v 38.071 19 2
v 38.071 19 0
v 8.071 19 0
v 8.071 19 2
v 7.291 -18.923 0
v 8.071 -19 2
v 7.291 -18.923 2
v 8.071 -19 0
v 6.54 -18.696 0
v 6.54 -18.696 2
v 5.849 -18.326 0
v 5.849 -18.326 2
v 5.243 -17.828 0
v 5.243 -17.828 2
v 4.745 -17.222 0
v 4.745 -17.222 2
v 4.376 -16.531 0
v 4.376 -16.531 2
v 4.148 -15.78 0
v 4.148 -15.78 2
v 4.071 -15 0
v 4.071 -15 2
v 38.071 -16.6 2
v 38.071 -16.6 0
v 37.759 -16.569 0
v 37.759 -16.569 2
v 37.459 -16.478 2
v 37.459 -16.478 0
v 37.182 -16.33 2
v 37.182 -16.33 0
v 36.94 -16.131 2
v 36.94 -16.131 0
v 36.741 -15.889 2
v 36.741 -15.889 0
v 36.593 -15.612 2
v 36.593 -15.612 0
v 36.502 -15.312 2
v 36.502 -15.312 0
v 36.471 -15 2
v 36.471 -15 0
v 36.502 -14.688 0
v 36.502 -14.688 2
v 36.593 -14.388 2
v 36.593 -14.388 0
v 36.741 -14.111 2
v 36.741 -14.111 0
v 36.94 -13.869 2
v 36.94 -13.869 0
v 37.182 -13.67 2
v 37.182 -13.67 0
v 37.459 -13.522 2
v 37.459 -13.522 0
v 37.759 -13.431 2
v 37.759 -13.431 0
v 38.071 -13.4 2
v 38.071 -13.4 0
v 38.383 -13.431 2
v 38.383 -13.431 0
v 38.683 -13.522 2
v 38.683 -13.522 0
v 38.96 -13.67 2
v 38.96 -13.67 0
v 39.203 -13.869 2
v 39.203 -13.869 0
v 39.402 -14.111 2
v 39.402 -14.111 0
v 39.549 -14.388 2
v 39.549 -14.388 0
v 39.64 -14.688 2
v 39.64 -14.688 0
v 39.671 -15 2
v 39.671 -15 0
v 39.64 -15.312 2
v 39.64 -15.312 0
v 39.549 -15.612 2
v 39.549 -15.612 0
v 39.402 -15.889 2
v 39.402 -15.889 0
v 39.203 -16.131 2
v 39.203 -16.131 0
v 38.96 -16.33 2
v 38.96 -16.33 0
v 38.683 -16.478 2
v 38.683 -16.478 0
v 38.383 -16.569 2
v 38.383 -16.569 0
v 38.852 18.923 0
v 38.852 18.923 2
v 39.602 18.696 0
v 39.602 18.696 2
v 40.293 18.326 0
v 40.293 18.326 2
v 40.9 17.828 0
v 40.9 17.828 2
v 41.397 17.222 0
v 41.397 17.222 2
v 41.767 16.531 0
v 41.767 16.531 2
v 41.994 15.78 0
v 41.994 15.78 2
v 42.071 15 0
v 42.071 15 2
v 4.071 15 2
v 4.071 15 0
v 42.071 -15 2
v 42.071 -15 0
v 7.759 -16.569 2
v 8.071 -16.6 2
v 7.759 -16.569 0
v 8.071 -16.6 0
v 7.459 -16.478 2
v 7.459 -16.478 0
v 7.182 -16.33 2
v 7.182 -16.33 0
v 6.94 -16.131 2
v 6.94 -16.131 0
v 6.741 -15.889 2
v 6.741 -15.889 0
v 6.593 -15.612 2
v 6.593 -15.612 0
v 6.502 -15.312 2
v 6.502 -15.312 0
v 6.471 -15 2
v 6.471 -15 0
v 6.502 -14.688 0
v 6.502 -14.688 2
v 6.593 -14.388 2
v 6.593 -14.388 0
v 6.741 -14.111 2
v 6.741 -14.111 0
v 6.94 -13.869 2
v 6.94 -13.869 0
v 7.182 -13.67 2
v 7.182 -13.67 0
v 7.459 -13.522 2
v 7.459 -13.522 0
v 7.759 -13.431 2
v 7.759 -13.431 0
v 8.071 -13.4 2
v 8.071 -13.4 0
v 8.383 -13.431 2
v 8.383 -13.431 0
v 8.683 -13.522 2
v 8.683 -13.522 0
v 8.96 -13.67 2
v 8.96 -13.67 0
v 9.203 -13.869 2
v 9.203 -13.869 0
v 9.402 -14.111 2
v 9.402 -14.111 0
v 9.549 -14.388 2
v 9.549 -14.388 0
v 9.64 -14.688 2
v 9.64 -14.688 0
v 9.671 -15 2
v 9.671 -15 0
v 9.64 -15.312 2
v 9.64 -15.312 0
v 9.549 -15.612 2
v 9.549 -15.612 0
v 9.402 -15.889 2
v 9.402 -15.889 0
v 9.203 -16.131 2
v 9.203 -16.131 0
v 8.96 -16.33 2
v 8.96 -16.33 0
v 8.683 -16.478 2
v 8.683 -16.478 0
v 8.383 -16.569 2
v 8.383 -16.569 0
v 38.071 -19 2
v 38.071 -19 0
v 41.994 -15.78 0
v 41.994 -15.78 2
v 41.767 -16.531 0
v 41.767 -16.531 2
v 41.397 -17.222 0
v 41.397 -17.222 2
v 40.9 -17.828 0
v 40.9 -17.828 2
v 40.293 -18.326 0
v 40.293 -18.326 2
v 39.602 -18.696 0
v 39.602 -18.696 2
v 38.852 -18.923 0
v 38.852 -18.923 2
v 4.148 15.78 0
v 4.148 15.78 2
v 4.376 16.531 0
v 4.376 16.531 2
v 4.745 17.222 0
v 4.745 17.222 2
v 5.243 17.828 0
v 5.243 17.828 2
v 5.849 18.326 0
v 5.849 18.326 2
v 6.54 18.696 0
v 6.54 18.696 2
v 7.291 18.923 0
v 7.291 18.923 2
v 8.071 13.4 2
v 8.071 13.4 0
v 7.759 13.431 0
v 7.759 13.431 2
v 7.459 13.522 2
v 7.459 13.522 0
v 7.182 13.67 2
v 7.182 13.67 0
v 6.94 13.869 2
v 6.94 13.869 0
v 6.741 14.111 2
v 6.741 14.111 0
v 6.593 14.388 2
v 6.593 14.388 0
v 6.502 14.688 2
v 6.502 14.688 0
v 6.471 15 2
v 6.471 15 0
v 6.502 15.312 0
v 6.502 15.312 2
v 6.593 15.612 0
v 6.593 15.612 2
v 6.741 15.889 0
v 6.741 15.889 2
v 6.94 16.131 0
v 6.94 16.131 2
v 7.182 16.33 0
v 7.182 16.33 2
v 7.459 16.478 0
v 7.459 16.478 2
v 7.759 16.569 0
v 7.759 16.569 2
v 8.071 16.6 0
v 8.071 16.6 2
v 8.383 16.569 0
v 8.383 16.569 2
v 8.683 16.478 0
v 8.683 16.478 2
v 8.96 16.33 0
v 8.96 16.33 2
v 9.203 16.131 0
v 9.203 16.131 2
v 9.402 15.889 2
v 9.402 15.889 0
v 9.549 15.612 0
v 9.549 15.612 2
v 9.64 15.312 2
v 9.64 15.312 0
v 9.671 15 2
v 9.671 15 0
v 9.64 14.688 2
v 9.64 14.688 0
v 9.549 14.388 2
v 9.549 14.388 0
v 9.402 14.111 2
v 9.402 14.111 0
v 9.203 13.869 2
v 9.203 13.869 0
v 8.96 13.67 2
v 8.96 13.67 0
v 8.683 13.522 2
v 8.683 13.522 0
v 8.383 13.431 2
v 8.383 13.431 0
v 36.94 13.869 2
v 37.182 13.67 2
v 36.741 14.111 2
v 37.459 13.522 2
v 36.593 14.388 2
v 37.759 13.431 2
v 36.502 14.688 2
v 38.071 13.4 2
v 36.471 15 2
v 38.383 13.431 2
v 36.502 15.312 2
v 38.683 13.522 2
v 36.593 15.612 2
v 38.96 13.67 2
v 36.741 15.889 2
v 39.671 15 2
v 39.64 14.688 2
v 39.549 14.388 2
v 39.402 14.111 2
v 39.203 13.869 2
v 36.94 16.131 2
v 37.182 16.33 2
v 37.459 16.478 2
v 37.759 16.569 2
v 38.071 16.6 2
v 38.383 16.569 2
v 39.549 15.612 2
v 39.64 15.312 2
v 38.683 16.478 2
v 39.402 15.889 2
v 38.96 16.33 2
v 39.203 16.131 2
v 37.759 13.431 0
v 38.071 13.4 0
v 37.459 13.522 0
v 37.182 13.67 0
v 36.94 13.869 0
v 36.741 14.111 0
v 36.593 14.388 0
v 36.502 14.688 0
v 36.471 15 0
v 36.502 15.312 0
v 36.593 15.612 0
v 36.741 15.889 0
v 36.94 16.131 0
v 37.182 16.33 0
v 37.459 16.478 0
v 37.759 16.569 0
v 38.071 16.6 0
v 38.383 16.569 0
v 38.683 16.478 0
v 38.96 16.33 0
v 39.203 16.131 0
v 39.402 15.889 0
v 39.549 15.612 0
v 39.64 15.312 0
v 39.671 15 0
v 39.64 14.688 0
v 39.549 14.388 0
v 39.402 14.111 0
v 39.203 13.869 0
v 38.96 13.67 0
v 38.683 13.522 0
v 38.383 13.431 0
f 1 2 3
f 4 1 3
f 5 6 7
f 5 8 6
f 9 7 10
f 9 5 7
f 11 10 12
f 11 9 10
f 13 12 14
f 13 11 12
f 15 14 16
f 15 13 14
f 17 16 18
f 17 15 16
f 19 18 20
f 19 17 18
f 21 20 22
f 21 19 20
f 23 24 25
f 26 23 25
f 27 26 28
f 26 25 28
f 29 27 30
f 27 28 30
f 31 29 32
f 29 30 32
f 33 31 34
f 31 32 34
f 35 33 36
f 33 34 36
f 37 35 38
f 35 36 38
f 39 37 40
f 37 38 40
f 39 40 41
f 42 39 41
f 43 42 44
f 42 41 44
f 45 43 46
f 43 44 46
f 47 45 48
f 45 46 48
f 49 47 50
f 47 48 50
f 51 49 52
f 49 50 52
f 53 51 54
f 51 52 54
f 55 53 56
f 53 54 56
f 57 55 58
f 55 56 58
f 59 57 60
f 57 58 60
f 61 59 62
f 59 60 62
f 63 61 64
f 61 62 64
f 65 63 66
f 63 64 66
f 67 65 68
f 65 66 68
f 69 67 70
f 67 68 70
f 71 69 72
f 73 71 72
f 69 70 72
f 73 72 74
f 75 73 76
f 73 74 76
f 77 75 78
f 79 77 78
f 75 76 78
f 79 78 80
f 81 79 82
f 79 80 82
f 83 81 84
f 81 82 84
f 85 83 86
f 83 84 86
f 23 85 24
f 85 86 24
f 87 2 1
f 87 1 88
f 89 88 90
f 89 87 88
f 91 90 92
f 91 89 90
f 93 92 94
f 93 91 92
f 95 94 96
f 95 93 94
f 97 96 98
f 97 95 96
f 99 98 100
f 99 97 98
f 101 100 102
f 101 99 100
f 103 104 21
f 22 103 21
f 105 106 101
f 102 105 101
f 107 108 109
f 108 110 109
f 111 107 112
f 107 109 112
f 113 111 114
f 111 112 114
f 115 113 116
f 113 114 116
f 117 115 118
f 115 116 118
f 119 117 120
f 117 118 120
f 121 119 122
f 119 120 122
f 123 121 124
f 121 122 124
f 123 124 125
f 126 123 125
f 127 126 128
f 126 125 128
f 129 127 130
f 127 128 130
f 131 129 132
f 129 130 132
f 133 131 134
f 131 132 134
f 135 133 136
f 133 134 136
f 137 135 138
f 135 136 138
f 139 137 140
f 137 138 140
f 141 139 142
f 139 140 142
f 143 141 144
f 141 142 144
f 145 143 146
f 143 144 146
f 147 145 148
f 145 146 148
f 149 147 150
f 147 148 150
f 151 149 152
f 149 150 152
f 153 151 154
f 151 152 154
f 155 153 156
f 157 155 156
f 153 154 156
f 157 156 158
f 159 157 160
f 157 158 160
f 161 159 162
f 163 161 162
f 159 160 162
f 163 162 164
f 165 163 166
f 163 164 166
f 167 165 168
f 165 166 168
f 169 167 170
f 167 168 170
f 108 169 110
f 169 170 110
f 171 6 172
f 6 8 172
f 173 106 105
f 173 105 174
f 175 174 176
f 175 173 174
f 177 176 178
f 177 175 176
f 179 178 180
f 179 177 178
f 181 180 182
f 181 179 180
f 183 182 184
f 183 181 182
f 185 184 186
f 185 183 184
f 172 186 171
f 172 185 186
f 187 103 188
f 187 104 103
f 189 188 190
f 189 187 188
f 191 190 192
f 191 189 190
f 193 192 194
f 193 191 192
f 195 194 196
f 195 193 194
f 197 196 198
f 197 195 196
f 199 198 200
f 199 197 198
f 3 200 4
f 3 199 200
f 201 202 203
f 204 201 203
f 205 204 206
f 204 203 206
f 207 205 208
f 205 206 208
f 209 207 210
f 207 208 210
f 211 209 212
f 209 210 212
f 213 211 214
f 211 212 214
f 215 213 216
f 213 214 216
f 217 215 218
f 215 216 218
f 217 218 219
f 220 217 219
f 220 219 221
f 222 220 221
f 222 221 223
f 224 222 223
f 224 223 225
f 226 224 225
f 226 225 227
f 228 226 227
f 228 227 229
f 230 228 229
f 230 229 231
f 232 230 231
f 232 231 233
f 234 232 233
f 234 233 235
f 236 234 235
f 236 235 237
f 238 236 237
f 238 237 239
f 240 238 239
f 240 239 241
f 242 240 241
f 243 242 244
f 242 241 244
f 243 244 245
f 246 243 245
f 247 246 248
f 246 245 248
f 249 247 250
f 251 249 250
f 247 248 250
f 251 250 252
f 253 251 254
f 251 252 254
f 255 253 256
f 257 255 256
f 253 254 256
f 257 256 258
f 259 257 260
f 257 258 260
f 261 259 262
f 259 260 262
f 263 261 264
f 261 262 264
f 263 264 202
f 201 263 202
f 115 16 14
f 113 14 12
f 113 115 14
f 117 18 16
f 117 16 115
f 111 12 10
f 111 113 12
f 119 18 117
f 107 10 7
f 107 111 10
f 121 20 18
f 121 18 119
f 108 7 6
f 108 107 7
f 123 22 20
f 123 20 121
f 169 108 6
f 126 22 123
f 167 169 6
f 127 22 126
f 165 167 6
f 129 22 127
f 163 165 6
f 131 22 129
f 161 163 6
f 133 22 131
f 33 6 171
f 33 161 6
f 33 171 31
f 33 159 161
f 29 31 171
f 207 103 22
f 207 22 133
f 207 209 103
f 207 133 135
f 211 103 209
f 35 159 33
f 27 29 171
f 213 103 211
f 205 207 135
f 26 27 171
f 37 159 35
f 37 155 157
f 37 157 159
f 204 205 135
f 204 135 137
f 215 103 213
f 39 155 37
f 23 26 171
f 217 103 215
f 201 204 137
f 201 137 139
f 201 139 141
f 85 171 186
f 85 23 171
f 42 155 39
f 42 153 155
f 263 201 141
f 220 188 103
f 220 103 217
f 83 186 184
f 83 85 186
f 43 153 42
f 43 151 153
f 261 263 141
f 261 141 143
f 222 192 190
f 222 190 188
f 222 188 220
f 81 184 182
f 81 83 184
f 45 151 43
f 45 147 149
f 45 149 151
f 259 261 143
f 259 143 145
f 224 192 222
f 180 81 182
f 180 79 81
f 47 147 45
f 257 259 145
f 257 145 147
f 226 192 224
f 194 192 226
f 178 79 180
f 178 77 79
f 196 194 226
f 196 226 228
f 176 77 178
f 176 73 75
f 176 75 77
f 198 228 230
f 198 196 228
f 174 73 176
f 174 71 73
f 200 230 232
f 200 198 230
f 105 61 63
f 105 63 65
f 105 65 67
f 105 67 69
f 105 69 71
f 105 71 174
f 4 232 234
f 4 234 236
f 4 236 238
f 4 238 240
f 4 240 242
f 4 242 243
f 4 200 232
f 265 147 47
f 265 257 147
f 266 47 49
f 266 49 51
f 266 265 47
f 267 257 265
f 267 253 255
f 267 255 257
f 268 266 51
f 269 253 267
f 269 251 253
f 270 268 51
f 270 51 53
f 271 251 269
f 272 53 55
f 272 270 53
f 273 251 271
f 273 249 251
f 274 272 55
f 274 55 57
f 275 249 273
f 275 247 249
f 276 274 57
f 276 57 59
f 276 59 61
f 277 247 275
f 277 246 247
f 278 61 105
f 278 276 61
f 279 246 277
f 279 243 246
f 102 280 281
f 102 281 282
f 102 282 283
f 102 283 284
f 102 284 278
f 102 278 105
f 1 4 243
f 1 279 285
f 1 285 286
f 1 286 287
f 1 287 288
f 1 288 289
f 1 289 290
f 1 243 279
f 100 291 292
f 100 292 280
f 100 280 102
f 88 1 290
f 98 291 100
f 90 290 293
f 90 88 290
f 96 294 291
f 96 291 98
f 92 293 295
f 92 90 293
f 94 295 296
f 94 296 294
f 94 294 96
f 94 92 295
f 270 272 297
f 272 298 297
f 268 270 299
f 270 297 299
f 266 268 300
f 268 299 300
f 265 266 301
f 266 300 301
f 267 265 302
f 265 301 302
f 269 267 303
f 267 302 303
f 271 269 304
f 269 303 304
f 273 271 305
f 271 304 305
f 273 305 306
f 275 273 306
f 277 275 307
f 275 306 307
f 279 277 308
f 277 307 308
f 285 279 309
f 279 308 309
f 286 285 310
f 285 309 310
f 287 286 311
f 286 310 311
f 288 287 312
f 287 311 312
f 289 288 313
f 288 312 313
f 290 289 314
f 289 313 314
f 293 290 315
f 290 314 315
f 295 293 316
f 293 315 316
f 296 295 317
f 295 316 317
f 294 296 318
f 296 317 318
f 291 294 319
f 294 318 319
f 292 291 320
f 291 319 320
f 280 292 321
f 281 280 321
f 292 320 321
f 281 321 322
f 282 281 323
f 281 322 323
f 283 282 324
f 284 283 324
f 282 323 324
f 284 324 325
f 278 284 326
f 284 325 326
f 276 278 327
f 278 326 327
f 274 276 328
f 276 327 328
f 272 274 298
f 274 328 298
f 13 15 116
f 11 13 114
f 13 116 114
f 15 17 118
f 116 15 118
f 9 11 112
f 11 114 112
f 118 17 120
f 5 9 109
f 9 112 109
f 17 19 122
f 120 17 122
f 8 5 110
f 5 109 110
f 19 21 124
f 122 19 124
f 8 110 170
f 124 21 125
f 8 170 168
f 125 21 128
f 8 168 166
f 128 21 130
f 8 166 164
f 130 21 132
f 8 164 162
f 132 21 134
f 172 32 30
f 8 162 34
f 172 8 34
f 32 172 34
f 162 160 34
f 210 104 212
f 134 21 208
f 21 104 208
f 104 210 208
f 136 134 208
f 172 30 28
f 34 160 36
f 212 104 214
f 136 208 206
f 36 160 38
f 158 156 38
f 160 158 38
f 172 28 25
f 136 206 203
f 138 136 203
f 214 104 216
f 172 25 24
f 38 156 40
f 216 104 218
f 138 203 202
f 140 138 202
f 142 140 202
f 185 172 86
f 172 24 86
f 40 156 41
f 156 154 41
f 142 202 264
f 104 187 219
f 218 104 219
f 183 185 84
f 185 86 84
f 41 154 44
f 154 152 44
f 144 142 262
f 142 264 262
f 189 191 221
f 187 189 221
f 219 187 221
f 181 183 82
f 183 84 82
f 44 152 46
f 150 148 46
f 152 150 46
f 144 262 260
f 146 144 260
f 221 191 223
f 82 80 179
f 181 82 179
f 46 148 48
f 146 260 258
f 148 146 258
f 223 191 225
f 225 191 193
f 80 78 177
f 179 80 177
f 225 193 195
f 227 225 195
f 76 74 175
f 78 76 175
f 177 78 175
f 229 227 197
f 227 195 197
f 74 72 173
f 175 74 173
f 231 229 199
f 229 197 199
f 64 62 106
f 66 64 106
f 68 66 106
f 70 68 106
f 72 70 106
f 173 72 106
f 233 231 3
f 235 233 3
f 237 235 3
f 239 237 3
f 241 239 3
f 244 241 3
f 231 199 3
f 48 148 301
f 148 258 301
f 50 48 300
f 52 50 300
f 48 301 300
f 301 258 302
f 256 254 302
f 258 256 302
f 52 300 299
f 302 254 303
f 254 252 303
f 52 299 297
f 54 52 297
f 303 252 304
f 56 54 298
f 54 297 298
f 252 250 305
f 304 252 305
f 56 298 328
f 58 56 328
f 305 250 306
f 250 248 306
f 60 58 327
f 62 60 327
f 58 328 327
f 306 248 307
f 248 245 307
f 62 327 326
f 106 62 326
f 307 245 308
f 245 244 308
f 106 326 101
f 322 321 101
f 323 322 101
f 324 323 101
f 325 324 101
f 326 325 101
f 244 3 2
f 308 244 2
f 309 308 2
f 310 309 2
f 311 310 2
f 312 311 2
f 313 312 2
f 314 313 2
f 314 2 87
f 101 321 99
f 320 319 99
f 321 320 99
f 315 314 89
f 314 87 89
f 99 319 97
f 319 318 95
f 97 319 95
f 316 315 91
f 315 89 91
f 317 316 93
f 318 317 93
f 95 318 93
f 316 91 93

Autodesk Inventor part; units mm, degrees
ref_plane "YZ Plane" through (0, 0, 0) normal (1, 0, 0) x (0, 1, 0)
ref_plane "XZ Plane" through (0, 0, 0) normal (0, 1, 0) x (-1, 0, 0)
ref_plane "XY Plane" through (0, 0, 0) normal (0, 0, 1) x (1, 0, 0)
ref_plane "Arbeitsebene1" through (0, 0, 0) normal (0, 0, 1) x (1, 0, 0)
sketch "Skizze1" plane through (0, 0, 0) normal (0, 0, 1) x (1, 0, 0)
  line L0 (14.5712, 11.3758) -> (14.5712, 4.0068) projected
  line L1 (13.3638, -15.5) -> (13.3638, 1.7) projected
  arc A0 (14.5712, 4.0068) -> (13.3638, 1.7) centre (16.1712, 1.7) ccw projected
  line L2 (8.0712, 15) -> (38.0712, 15)
  line L3 (38.0712, 15) -> (38.0712, -15)
  line L4 (38.0712, -15) -> (8.0712, -15)
  line L5 (8.0712, -15) -> (8.0712, 15)
  line L6 (38.0712, 19) -> (8.0712, 19)
  line L7 (4.0712, 15) -> (4.0712, -15)
  line L8 (8.0712, -19) -> (38.0712, -19)
  line L9 (42.0712, -15) -> (42.0712, 15)
  arc A1 (8.0712, 19) -> (4.0712, 15) centre (8.0712, 15) ccw
  arc A2 (42.0712, 15) -> (38.0712, 19) centre (38.0712, 15) ccw
  arc A3 (38.0712, -19) -> (42.0712, -15) centre (38.0712, -15) ccw
  arc A4 (4.0712, -15) -> (8.0712, -19) centre (8.0712, -15) ccw
  line L10 (10.5793, 11.3758) -> (14.5712, 11.3758) projected
  line L11 (36.5793, 10.3758) -> (36.5793, -24.4) projected
  arc A5 (36.5793, 10.3758) -> (35.5793, 11.3758) centre (35.5793, 10.3758) ccw projected
  line L12 (9.5793, -24.4) -> (9.5793, 10.3758) projected
  line L13 (36.5793, -24.4) -> (9.5793, -24.4) projected
  line L14 (31.5712, 11.3758) -> (35.5793, 11.3758) projected
  line L15 (31.5712, 4.0068) -> (31.5712, 11.3758) projected
  arc A6 (10.5793, 11.3758) -> (9.5793, 10.3758) centre (10.5793, 10.3758) ccw projected
  arc A7 (32.7786, 1.7) -> (31.5712, 4.0068) centre (29.9712, 1.7) ccw projected
  line L16 (32.7786, 1.7) -> (32.7786, -15.5) projected
  arc A8 (29.9712, -18.3074) -> (32.7786, -15.5) centre (29.9712, -15.5) ccw projected
  line L17 (29.9712, -18.3074) -> (16.1712, -18.3074) projected
  arc A9 (13.3638, -15.5) -> (16.1712, -18.3074) centre (16.1712, -15.5) ccw projected
  point P0 (0, 0)
  dimension "d0" = 4
  dimension "d1" = 4
extrude "Extrusion1" add sketch "Skizze1" along normal blind 2 contours L10 A6 L12 L4 L5 L2 L3 L11 A5 L14 L15 A7 L16 L1 A0 L0 | L0 A0 L1 L4 L12 A6 L10 | L4 L16 A8 L17 A9 L1 | L1 A9 L17 A8 L16 L4 L11 L8 L12 | L12 L8 A4 L7 A1 L6 A2 L9 A3 L11 L4 L3 L2 L5 | L16 A7 L15 L14 A5 L11 L4
ref_plane "Arbeitsebene2" through (0, 0, 0) normal (0, 0, 1) x (1, 0, 0)
sketch "Skizze2" plane through (0, 0, 2) normal (0, 0, 1) x (1, 0, 0)
  arc A0 (8.0712, 19) -> (4.0712, 15) centre (8.0712, 15) ccw projected
  line L0 (4.0712, 15) -> (4.0712, -15) projected
  arc A1 (4.0712, -15) -> (8.0712, -19) centre (8.0712, -15) ccw projected
  line L1 (8.0712, -19) -> (38.0712, -19) projected
  arc A2 (38.0712, -19) -> (42.0712, -15) centre (38.0712, -15) ccw projected
  line L2 (42.0712, -15) -> (42.0712, 15) projected
  arc A3 (42.0712, 15) -> (38.0712, 19) centre (38.0712, 15) ccw projected
  line L3 (38.0712, 19) -> (8.0712, 19) projected
  circle A4 centre (8.0712, 15) radius 1.4 projected
  circle A5 centre (38.0712, 15) radius 1.4 projected
  circle A6 centre (38.0712, -15) radius 1.4 projected
  circle A7 centre (8.0712, -15) radius 1.4 projected
  point P0 (0, 0)
hole "Bohrung1" at (8.0712, 15, 2) at (8.0712, -15, 2) at (38.0712, -15, 2) at (38.0712, 15, 2) direction (0, 0, -1) diameter 3.2 end through all
properties part number "20_Cube_Insert_SEEED_Xiao_Sense_Camera_backplate"
